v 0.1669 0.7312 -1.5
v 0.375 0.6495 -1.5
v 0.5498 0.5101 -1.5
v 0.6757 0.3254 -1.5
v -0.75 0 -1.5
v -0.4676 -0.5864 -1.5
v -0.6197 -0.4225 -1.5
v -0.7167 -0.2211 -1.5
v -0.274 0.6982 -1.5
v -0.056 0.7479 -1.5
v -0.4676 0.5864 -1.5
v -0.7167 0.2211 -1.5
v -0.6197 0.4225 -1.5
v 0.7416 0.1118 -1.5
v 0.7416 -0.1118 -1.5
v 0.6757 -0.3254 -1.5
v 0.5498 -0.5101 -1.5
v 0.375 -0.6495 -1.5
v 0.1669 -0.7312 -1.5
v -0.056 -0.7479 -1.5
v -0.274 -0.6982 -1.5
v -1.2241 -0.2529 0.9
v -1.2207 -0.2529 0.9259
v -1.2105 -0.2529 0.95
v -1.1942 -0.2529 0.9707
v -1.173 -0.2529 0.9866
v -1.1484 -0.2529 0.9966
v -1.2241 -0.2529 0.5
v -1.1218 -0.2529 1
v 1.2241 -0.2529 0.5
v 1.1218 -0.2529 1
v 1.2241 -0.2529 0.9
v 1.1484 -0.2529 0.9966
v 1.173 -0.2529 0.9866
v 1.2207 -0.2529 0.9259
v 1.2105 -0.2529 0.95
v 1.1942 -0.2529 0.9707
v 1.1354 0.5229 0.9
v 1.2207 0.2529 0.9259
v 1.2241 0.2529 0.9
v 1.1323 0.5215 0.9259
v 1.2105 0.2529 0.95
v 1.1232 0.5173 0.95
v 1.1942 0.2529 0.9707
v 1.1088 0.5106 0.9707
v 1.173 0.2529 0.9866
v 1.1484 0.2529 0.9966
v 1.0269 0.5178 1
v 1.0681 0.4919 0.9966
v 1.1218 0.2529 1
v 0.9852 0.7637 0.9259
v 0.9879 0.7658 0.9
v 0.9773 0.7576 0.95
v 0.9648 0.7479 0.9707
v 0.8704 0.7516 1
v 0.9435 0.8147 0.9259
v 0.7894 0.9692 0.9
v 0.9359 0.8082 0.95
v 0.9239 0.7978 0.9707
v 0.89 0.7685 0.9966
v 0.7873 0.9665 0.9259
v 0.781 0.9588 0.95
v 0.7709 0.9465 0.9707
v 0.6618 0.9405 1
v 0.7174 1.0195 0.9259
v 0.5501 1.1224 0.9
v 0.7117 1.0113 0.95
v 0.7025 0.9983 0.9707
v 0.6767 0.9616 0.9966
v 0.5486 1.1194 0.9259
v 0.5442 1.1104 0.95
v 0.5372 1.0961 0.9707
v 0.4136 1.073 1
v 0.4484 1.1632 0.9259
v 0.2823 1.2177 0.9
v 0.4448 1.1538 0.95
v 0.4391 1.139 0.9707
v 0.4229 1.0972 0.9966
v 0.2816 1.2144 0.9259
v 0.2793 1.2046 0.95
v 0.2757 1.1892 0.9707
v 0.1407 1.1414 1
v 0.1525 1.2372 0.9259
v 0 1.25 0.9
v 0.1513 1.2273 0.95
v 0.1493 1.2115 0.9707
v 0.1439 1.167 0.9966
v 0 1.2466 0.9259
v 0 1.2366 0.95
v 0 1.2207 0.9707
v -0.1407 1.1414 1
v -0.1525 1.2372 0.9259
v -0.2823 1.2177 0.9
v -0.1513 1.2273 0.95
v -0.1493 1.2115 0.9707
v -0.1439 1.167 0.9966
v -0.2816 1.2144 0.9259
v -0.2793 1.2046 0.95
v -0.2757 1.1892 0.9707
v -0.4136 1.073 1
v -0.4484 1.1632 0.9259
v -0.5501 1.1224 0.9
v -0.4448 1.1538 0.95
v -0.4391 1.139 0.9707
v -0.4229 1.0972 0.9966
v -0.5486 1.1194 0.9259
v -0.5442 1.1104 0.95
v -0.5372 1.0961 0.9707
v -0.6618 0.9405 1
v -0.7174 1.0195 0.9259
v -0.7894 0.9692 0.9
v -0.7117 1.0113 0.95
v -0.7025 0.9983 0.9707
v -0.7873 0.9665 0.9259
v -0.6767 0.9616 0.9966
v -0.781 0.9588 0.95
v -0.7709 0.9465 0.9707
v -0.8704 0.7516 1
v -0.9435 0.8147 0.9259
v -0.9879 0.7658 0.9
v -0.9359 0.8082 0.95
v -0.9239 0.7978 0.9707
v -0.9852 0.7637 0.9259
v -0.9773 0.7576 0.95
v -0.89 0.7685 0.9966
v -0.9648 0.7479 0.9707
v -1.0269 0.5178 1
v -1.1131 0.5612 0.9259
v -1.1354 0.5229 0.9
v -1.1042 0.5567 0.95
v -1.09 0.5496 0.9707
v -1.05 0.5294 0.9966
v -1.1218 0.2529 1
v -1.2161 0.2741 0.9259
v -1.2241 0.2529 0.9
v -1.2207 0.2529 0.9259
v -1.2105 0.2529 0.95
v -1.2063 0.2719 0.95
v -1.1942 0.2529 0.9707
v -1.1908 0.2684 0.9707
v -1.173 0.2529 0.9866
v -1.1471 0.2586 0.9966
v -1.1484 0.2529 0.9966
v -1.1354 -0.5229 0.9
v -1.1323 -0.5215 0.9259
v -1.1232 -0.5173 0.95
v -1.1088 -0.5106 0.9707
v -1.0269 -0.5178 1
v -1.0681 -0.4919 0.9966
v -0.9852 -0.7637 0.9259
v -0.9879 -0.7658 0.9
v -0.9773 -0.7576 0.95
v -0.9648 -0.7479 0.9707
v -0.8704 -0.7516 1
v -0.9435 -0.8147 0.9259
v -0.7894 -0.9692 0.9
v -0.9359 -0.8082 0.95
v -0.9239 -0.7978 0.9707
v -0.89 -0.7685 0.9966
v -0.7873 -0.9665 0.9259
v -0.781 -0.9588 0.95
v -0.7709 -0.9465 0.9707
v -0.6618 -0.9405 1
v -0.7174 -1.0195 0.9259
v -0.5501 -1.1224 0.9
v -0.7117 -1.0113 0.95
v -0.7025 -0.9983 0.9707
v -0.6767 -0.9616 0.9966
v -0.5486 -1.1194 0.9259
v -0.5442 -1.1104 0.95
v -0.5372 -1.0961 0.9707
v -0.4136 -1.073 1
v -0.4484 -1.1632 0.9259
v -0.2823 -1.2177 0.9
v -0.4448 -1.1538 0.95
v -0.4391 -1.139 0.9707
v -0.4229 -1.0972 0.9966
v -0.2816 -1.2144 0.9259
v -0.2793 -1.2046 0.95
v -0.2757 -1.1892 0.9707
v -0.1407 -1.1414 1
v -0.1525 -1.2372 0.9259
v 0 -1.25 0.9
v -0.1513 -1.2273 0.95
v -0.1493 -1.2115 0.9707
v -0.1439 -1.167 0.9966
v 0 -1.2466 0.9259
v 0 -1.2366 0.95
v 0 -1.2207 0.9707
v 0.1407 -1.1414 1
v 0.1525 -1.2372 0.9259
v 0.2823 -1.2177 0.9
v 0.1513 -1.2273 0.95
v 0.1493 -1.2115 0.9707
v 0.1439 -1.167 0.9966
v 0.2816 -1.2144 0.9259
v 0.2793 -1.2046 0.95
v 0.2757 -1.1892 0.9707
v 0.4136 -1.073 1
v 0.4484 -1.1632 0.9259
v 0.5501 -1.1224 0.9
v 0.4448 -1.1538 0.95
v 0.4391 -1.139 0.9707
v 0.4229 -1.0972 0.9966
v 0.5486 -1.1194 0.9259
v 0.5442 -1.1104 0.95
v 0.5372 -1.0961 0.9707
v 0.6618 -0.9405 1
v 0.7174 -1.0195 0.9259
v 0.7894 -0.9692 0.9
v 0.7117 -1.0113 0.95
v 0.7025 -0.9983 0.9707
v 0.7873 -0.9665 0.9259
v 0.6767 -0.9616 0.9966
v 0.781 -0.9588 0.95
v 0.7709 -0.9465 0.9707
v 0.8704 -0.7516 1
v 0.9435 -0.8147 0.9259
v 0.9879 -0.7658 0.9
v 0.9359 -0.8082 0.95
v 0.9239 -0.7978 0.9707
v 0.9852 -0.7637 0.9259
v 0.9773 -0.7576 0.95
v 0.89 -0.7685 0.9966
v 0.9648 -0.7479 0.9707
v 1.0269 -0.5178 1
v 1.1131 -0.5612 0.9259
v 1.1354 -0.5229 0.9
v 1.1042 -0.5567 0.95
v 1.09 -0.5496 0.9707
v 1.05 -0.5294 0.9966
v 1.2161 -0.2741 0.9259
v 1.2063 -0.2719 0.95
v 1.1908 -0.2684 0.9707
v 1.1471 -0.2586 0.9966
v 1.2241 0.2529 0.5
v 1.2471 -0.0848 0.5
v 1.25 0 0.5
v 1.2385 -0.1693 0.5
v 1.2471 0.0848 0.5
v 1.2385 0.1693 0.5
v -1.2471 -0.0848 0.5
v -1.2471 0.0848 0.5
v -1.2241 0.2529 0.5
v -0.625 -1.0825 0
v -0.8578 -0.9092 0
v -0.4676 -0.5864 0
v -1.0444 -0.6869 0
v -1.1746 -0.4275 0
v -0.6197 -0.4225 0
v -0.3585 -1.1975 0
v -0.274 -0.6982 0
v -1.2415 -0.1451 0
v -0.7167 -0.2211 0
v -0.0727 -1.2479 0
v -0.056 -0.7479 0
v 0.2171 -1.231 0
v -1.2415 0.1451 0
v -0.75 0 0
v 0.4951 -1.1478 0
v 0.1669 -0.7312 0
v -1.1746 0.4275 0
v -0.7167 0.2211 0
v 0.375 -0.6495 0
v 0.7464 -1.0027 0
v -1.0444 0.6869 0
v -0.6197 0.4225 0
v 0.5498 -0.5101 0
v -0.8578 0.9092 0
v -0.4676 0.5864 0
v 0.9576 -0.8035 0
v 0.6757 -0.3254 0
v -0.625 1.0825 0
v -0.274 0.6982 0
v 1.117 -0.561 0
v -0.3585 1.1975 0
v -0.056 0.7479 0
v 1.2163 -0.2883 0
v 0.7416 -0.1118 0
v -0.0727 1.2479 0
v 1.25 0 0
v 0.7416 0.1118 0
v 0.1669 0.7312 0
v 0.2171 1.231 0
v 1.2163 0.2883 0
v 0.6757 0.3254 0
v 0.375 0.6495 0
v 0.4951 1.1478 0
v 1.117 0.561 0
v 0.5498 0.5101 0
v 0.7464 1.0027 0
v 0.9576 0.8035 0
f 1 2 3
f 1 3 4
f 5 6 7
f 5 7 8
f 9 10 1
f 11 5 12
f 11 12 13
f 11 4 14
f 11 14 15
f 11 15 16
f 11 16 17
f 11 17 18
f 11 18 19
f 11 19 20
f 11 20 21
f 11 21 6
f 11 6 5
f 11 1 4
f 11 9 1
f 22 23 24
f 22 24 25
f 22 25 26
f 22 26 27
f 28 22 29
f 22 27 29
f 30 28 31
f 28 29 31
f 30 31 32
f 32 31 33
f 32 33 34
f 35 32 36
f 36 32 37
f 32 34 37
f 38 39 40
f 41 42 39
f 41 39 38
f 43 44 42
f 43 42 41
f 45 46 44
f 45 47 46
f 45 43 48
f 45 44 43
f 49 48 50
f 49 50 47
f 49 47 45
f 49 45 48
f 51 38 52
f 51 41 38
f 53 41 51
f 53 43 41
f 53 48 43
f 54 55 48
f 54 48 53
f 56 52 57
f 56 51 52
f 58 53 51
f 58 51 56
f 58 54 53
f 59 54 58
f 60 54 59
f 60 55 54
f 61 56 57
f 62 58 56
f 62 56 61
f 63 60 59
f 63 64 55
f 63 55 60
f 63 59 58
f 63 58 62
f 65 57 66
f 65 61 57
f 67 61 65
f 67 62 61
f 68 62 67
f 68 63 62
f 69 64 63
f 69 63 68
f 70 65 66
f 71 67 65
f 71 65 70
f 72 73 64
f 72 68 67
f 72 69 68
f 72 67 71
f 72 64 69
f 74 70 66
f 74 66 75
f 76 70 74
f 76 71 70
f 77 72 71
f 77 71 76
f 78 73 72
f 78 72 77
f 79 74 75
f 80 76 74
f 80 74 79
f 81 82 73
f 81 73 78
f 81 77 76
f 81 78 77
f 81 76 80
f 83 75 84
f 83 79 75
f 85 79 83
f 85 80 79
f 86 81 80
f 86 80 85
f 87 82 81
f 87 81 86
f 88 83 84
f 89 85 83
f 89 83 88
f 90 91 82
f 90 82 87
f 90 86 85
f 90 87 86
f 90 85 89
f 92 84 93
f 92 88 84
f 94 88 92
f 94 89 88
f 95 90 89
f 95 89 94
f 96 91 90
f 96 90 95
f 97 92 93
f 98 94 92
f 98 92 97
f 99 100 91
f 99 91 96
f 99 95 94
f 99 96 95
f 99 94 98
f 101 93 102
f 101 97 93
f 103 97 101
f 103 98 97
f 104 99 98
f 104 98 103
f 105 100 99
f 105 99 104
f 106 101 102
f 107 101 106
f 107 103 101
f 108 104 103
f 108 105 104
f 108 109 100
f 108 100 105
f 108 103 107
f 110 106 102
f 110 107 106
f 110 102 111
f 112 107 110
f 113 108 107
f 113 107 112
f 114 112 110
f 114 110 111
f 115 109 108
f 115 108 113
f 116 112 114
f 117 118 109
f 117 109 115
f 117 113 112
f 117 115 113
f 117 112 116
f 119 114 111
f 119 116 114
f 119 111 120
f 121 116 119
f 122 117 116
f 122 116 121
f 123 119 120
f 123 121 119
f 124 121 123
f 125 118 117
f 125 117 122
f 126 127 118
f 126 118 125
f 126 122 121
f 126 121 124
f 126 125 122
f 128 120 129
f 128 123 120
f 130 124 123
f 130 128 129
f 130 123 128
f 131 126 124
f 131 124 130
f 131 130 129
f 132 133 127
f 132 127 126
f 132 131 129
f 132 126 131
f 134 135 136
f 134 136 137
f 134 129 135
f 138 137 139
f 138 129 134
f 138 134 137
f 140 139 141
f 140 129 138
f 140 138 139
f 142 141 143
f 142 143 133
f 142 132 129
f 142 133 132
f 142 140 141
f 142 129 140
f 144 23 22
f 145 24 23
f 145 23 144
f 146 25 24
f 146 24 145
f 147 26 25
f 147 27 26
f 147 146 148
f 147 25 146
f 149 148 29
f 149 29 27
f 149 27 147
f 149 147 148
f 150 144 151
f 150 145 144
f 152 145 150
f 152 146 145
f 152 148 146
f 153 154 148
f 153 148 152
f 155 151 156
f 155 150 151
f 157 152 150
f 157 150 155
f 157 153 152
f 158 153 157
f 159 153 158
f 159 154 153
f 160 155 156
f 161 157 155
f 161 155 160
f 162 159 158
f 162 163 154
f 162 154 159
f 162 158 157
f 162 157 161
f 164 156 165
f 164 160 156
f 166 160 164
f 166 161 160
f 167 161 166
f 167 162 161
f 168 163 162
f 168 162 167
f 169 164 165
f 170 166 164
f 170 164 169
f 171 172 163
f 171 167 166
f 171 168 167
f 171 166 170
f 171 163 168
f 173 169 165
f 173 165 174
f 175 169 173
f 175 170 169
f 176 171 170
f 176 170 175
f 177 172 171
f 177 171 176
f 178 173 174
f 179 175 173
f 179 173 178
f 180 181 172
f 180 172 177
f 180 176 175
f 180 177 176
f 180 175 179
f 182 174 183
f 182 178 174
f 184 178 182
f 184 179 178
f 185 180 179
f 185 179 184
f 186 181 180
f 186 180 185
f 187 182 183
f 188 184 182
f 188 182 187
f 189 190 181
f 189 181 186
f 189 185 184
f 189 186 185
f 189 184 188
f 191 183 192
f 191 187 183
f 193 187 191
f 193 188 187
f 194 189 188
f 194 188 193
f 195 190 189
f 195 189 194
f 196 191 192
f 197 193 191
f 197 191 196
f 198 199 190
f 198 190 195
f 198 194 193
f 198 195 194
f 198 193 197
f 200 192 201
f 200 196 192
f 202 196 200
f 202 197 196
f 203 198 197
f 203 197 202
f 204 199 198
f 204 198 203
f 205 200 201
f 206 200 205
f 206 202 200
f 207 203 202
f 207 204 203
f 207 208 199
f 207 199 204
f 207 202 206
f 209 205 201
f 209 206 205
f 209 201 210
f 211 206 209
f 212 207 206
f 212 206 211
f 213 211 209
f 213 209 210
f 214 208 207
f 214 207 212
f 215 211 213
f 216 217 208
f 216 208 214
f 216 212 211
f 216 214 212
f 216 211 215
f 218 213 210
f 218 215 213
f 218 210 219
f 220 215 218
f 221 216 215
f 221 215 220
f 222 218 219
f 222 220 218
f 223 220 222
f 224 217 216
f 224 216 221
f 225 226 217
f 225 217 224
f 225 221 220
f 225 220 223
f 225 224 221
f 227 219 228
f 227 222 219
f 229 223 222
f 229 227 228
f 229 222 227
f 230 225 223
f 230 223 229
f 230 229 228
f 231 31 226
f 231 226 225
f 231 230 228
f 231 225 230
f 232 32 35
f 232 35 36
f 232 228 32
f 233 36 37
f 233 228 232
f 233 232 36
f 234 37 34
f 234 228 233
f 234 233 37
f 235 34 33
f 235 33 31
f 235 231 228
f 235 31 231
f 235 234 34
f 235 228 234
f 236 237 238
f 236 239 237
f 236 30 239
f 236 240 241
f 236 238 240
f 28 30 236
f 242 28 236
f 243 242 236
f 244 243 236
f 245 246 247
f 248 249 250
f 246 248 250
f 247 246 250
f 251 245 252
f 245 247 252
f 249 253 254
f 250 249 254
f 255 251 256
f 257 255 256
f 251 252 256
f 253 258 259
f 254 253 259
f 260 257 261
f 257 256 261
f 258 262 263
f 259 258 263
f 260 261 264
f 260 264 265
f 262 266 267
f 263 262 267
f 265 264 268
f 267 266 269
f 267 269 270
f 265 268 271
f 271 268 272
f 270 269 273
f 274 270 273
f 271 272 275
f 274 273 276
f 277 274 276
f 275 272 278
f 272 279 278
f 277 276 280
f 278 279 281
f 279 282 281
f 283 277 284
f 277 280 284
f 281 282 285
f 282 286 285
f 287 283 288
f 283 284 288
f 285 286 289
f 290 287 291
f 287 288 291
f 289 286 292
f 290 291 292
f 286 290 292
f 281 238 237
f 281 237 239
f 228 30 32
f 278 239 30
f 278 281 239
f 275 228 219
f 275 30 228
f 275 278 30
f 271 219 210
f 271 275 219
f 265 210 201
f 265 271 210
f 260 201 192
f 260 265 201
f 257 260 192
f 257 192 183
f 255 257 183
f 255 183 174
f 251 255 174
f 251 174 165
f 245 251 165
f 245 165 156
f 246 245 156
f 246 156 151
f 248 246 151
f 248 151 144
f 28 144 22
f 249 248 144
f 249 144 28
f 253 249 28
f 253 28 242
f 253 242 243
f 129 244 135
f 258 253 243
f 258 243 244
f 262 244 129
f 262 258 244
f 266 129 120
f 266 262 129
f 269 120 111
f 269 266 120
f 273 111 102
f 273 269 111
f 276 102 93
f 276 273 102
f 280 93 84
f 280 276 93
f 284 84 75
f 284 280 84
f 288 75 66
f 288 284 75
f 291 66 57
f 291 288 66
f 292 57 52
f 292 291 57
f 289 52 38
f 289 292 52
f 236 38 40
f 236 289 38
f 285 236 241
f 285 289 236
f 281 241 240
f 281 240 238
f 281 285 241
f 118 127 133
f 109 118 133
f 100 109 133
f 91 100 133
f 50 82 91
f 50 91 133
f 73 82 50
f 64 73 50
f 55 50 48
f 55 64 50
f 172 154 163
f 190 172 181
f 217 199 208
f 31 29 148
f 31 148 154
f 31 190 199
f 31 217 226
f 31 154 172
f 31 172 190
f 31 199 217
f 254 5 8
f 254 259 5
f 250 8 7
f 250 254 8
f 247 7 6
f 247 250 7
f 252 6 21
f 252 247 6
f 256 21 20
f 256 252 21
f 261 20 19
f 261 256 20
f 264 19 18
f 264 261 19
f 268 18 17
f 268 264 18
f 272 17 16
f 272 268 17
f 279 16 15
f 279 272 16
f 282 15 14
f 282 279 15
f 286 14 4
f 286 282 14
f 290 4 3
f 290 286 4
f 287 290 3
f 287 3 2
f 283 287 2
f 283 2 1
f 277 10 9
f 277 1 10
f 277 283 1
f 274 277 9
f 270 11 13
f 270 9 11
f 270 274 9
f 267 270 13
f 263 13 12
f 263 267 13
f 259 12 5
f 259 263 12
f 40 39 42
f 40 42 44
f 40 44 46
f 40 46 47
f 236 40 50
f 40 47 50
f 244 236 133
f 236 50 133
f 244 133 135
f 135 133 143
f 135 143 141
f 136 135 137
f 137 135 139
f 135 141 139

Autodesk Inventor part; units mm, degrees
ref_plane "YZ Plane" through (0, 0, 0) normal (1, 0, 0) x (0, 1, 0)
ref_plane "XZ Plane" through (0, 0, 0) normal (0, 1, 0) x (-1, 0, 0)
ref_plane "XY Plane" through (0, 0, 0) normal (0, 0, 1) x (1, 0, 0)
sketch "Esboço1" plane through (0, 0, 0) normal (0, 0, 1) x (1, 0, 0)
  circle A0 centre (0, 0) radius 1.25
  dimension "d0" = 2.5
extrude "Extrusão1" add sketch "Esboço1" along normal blind 1
sketch "Esboço2" plane through (0, 0, 0) normal (0, 0, -1) x (-1, 0, 0)
  circle A0 centre (0, 0) radius 0.75
  dimension "d3" = 1.5
extrude "Extrusão2" add sketch "Esboço2" along normal blind 1.5
sketch "Esboço3" plane through (0, 0, 1) normal (0, 0, 1) x (1, 0, 0)
  circle A0 centre (0, 0) radius 1.25 projected
  line L0 (-1.2241, -0.2529) -> (1.2241, -0.2529)
  line L1 (1.2241, -0.2529) -> (1.2241, 0.2529)
  line L2 (1.2241, 0.2529) -> (-1.2241, 0.2529)
  line L3 (-1.2241, 0.2529) -> (-1.2241, -0.2529)
  line L4 (-1.2241, -0.2529) -> (1.2241, 0.2529) construction
  line L5 (1.2241, -0.2529) -> (-1.2241, 0.2529) construction
  dimension "d6" = 2.4483
extrude "Extrusão3" cut sketch "Esboço3" against normal blind 0.5 contours L1 L0 L3 L2
sketch "Esboço4" plane through (-1.2241, -0.2529, 1) normal (1, 0, 0) x (0, 0, -1)
  line L0 (0, 0.5058) -> (0, 0) projected
  line L1 (0.5, 0) -> (0.5, 0.5058) projected
  line L2 (0, 0.5058) -> (0.5, 0.5058)
  line L3 (0.5, 0.5058) -> (0.5, 0)
  line L4 (0.5, 0) -> (0, 0) projected
  line L5 (0.5, 0) -> (0, 0)
  line L6 (0, 0) -> (0, 0.5058)
  point P0 (1, 0.2529)
extrude "Extrusão4" cut sketch "Esboço4" along normal mid plane 6
fillet "Arredondamento1" radius 0.1 1 edges at (0, 1.25, 1)
fillet "Arredondamento1" radius 0.1 1 edges at (0, -1.25, 1)
thread "Rosca1" size "M1.6x0.35" class "6g" standard "ANSI Metric M Profile" length 15.255
properties material "Liga de Nickel-Copper 400"
